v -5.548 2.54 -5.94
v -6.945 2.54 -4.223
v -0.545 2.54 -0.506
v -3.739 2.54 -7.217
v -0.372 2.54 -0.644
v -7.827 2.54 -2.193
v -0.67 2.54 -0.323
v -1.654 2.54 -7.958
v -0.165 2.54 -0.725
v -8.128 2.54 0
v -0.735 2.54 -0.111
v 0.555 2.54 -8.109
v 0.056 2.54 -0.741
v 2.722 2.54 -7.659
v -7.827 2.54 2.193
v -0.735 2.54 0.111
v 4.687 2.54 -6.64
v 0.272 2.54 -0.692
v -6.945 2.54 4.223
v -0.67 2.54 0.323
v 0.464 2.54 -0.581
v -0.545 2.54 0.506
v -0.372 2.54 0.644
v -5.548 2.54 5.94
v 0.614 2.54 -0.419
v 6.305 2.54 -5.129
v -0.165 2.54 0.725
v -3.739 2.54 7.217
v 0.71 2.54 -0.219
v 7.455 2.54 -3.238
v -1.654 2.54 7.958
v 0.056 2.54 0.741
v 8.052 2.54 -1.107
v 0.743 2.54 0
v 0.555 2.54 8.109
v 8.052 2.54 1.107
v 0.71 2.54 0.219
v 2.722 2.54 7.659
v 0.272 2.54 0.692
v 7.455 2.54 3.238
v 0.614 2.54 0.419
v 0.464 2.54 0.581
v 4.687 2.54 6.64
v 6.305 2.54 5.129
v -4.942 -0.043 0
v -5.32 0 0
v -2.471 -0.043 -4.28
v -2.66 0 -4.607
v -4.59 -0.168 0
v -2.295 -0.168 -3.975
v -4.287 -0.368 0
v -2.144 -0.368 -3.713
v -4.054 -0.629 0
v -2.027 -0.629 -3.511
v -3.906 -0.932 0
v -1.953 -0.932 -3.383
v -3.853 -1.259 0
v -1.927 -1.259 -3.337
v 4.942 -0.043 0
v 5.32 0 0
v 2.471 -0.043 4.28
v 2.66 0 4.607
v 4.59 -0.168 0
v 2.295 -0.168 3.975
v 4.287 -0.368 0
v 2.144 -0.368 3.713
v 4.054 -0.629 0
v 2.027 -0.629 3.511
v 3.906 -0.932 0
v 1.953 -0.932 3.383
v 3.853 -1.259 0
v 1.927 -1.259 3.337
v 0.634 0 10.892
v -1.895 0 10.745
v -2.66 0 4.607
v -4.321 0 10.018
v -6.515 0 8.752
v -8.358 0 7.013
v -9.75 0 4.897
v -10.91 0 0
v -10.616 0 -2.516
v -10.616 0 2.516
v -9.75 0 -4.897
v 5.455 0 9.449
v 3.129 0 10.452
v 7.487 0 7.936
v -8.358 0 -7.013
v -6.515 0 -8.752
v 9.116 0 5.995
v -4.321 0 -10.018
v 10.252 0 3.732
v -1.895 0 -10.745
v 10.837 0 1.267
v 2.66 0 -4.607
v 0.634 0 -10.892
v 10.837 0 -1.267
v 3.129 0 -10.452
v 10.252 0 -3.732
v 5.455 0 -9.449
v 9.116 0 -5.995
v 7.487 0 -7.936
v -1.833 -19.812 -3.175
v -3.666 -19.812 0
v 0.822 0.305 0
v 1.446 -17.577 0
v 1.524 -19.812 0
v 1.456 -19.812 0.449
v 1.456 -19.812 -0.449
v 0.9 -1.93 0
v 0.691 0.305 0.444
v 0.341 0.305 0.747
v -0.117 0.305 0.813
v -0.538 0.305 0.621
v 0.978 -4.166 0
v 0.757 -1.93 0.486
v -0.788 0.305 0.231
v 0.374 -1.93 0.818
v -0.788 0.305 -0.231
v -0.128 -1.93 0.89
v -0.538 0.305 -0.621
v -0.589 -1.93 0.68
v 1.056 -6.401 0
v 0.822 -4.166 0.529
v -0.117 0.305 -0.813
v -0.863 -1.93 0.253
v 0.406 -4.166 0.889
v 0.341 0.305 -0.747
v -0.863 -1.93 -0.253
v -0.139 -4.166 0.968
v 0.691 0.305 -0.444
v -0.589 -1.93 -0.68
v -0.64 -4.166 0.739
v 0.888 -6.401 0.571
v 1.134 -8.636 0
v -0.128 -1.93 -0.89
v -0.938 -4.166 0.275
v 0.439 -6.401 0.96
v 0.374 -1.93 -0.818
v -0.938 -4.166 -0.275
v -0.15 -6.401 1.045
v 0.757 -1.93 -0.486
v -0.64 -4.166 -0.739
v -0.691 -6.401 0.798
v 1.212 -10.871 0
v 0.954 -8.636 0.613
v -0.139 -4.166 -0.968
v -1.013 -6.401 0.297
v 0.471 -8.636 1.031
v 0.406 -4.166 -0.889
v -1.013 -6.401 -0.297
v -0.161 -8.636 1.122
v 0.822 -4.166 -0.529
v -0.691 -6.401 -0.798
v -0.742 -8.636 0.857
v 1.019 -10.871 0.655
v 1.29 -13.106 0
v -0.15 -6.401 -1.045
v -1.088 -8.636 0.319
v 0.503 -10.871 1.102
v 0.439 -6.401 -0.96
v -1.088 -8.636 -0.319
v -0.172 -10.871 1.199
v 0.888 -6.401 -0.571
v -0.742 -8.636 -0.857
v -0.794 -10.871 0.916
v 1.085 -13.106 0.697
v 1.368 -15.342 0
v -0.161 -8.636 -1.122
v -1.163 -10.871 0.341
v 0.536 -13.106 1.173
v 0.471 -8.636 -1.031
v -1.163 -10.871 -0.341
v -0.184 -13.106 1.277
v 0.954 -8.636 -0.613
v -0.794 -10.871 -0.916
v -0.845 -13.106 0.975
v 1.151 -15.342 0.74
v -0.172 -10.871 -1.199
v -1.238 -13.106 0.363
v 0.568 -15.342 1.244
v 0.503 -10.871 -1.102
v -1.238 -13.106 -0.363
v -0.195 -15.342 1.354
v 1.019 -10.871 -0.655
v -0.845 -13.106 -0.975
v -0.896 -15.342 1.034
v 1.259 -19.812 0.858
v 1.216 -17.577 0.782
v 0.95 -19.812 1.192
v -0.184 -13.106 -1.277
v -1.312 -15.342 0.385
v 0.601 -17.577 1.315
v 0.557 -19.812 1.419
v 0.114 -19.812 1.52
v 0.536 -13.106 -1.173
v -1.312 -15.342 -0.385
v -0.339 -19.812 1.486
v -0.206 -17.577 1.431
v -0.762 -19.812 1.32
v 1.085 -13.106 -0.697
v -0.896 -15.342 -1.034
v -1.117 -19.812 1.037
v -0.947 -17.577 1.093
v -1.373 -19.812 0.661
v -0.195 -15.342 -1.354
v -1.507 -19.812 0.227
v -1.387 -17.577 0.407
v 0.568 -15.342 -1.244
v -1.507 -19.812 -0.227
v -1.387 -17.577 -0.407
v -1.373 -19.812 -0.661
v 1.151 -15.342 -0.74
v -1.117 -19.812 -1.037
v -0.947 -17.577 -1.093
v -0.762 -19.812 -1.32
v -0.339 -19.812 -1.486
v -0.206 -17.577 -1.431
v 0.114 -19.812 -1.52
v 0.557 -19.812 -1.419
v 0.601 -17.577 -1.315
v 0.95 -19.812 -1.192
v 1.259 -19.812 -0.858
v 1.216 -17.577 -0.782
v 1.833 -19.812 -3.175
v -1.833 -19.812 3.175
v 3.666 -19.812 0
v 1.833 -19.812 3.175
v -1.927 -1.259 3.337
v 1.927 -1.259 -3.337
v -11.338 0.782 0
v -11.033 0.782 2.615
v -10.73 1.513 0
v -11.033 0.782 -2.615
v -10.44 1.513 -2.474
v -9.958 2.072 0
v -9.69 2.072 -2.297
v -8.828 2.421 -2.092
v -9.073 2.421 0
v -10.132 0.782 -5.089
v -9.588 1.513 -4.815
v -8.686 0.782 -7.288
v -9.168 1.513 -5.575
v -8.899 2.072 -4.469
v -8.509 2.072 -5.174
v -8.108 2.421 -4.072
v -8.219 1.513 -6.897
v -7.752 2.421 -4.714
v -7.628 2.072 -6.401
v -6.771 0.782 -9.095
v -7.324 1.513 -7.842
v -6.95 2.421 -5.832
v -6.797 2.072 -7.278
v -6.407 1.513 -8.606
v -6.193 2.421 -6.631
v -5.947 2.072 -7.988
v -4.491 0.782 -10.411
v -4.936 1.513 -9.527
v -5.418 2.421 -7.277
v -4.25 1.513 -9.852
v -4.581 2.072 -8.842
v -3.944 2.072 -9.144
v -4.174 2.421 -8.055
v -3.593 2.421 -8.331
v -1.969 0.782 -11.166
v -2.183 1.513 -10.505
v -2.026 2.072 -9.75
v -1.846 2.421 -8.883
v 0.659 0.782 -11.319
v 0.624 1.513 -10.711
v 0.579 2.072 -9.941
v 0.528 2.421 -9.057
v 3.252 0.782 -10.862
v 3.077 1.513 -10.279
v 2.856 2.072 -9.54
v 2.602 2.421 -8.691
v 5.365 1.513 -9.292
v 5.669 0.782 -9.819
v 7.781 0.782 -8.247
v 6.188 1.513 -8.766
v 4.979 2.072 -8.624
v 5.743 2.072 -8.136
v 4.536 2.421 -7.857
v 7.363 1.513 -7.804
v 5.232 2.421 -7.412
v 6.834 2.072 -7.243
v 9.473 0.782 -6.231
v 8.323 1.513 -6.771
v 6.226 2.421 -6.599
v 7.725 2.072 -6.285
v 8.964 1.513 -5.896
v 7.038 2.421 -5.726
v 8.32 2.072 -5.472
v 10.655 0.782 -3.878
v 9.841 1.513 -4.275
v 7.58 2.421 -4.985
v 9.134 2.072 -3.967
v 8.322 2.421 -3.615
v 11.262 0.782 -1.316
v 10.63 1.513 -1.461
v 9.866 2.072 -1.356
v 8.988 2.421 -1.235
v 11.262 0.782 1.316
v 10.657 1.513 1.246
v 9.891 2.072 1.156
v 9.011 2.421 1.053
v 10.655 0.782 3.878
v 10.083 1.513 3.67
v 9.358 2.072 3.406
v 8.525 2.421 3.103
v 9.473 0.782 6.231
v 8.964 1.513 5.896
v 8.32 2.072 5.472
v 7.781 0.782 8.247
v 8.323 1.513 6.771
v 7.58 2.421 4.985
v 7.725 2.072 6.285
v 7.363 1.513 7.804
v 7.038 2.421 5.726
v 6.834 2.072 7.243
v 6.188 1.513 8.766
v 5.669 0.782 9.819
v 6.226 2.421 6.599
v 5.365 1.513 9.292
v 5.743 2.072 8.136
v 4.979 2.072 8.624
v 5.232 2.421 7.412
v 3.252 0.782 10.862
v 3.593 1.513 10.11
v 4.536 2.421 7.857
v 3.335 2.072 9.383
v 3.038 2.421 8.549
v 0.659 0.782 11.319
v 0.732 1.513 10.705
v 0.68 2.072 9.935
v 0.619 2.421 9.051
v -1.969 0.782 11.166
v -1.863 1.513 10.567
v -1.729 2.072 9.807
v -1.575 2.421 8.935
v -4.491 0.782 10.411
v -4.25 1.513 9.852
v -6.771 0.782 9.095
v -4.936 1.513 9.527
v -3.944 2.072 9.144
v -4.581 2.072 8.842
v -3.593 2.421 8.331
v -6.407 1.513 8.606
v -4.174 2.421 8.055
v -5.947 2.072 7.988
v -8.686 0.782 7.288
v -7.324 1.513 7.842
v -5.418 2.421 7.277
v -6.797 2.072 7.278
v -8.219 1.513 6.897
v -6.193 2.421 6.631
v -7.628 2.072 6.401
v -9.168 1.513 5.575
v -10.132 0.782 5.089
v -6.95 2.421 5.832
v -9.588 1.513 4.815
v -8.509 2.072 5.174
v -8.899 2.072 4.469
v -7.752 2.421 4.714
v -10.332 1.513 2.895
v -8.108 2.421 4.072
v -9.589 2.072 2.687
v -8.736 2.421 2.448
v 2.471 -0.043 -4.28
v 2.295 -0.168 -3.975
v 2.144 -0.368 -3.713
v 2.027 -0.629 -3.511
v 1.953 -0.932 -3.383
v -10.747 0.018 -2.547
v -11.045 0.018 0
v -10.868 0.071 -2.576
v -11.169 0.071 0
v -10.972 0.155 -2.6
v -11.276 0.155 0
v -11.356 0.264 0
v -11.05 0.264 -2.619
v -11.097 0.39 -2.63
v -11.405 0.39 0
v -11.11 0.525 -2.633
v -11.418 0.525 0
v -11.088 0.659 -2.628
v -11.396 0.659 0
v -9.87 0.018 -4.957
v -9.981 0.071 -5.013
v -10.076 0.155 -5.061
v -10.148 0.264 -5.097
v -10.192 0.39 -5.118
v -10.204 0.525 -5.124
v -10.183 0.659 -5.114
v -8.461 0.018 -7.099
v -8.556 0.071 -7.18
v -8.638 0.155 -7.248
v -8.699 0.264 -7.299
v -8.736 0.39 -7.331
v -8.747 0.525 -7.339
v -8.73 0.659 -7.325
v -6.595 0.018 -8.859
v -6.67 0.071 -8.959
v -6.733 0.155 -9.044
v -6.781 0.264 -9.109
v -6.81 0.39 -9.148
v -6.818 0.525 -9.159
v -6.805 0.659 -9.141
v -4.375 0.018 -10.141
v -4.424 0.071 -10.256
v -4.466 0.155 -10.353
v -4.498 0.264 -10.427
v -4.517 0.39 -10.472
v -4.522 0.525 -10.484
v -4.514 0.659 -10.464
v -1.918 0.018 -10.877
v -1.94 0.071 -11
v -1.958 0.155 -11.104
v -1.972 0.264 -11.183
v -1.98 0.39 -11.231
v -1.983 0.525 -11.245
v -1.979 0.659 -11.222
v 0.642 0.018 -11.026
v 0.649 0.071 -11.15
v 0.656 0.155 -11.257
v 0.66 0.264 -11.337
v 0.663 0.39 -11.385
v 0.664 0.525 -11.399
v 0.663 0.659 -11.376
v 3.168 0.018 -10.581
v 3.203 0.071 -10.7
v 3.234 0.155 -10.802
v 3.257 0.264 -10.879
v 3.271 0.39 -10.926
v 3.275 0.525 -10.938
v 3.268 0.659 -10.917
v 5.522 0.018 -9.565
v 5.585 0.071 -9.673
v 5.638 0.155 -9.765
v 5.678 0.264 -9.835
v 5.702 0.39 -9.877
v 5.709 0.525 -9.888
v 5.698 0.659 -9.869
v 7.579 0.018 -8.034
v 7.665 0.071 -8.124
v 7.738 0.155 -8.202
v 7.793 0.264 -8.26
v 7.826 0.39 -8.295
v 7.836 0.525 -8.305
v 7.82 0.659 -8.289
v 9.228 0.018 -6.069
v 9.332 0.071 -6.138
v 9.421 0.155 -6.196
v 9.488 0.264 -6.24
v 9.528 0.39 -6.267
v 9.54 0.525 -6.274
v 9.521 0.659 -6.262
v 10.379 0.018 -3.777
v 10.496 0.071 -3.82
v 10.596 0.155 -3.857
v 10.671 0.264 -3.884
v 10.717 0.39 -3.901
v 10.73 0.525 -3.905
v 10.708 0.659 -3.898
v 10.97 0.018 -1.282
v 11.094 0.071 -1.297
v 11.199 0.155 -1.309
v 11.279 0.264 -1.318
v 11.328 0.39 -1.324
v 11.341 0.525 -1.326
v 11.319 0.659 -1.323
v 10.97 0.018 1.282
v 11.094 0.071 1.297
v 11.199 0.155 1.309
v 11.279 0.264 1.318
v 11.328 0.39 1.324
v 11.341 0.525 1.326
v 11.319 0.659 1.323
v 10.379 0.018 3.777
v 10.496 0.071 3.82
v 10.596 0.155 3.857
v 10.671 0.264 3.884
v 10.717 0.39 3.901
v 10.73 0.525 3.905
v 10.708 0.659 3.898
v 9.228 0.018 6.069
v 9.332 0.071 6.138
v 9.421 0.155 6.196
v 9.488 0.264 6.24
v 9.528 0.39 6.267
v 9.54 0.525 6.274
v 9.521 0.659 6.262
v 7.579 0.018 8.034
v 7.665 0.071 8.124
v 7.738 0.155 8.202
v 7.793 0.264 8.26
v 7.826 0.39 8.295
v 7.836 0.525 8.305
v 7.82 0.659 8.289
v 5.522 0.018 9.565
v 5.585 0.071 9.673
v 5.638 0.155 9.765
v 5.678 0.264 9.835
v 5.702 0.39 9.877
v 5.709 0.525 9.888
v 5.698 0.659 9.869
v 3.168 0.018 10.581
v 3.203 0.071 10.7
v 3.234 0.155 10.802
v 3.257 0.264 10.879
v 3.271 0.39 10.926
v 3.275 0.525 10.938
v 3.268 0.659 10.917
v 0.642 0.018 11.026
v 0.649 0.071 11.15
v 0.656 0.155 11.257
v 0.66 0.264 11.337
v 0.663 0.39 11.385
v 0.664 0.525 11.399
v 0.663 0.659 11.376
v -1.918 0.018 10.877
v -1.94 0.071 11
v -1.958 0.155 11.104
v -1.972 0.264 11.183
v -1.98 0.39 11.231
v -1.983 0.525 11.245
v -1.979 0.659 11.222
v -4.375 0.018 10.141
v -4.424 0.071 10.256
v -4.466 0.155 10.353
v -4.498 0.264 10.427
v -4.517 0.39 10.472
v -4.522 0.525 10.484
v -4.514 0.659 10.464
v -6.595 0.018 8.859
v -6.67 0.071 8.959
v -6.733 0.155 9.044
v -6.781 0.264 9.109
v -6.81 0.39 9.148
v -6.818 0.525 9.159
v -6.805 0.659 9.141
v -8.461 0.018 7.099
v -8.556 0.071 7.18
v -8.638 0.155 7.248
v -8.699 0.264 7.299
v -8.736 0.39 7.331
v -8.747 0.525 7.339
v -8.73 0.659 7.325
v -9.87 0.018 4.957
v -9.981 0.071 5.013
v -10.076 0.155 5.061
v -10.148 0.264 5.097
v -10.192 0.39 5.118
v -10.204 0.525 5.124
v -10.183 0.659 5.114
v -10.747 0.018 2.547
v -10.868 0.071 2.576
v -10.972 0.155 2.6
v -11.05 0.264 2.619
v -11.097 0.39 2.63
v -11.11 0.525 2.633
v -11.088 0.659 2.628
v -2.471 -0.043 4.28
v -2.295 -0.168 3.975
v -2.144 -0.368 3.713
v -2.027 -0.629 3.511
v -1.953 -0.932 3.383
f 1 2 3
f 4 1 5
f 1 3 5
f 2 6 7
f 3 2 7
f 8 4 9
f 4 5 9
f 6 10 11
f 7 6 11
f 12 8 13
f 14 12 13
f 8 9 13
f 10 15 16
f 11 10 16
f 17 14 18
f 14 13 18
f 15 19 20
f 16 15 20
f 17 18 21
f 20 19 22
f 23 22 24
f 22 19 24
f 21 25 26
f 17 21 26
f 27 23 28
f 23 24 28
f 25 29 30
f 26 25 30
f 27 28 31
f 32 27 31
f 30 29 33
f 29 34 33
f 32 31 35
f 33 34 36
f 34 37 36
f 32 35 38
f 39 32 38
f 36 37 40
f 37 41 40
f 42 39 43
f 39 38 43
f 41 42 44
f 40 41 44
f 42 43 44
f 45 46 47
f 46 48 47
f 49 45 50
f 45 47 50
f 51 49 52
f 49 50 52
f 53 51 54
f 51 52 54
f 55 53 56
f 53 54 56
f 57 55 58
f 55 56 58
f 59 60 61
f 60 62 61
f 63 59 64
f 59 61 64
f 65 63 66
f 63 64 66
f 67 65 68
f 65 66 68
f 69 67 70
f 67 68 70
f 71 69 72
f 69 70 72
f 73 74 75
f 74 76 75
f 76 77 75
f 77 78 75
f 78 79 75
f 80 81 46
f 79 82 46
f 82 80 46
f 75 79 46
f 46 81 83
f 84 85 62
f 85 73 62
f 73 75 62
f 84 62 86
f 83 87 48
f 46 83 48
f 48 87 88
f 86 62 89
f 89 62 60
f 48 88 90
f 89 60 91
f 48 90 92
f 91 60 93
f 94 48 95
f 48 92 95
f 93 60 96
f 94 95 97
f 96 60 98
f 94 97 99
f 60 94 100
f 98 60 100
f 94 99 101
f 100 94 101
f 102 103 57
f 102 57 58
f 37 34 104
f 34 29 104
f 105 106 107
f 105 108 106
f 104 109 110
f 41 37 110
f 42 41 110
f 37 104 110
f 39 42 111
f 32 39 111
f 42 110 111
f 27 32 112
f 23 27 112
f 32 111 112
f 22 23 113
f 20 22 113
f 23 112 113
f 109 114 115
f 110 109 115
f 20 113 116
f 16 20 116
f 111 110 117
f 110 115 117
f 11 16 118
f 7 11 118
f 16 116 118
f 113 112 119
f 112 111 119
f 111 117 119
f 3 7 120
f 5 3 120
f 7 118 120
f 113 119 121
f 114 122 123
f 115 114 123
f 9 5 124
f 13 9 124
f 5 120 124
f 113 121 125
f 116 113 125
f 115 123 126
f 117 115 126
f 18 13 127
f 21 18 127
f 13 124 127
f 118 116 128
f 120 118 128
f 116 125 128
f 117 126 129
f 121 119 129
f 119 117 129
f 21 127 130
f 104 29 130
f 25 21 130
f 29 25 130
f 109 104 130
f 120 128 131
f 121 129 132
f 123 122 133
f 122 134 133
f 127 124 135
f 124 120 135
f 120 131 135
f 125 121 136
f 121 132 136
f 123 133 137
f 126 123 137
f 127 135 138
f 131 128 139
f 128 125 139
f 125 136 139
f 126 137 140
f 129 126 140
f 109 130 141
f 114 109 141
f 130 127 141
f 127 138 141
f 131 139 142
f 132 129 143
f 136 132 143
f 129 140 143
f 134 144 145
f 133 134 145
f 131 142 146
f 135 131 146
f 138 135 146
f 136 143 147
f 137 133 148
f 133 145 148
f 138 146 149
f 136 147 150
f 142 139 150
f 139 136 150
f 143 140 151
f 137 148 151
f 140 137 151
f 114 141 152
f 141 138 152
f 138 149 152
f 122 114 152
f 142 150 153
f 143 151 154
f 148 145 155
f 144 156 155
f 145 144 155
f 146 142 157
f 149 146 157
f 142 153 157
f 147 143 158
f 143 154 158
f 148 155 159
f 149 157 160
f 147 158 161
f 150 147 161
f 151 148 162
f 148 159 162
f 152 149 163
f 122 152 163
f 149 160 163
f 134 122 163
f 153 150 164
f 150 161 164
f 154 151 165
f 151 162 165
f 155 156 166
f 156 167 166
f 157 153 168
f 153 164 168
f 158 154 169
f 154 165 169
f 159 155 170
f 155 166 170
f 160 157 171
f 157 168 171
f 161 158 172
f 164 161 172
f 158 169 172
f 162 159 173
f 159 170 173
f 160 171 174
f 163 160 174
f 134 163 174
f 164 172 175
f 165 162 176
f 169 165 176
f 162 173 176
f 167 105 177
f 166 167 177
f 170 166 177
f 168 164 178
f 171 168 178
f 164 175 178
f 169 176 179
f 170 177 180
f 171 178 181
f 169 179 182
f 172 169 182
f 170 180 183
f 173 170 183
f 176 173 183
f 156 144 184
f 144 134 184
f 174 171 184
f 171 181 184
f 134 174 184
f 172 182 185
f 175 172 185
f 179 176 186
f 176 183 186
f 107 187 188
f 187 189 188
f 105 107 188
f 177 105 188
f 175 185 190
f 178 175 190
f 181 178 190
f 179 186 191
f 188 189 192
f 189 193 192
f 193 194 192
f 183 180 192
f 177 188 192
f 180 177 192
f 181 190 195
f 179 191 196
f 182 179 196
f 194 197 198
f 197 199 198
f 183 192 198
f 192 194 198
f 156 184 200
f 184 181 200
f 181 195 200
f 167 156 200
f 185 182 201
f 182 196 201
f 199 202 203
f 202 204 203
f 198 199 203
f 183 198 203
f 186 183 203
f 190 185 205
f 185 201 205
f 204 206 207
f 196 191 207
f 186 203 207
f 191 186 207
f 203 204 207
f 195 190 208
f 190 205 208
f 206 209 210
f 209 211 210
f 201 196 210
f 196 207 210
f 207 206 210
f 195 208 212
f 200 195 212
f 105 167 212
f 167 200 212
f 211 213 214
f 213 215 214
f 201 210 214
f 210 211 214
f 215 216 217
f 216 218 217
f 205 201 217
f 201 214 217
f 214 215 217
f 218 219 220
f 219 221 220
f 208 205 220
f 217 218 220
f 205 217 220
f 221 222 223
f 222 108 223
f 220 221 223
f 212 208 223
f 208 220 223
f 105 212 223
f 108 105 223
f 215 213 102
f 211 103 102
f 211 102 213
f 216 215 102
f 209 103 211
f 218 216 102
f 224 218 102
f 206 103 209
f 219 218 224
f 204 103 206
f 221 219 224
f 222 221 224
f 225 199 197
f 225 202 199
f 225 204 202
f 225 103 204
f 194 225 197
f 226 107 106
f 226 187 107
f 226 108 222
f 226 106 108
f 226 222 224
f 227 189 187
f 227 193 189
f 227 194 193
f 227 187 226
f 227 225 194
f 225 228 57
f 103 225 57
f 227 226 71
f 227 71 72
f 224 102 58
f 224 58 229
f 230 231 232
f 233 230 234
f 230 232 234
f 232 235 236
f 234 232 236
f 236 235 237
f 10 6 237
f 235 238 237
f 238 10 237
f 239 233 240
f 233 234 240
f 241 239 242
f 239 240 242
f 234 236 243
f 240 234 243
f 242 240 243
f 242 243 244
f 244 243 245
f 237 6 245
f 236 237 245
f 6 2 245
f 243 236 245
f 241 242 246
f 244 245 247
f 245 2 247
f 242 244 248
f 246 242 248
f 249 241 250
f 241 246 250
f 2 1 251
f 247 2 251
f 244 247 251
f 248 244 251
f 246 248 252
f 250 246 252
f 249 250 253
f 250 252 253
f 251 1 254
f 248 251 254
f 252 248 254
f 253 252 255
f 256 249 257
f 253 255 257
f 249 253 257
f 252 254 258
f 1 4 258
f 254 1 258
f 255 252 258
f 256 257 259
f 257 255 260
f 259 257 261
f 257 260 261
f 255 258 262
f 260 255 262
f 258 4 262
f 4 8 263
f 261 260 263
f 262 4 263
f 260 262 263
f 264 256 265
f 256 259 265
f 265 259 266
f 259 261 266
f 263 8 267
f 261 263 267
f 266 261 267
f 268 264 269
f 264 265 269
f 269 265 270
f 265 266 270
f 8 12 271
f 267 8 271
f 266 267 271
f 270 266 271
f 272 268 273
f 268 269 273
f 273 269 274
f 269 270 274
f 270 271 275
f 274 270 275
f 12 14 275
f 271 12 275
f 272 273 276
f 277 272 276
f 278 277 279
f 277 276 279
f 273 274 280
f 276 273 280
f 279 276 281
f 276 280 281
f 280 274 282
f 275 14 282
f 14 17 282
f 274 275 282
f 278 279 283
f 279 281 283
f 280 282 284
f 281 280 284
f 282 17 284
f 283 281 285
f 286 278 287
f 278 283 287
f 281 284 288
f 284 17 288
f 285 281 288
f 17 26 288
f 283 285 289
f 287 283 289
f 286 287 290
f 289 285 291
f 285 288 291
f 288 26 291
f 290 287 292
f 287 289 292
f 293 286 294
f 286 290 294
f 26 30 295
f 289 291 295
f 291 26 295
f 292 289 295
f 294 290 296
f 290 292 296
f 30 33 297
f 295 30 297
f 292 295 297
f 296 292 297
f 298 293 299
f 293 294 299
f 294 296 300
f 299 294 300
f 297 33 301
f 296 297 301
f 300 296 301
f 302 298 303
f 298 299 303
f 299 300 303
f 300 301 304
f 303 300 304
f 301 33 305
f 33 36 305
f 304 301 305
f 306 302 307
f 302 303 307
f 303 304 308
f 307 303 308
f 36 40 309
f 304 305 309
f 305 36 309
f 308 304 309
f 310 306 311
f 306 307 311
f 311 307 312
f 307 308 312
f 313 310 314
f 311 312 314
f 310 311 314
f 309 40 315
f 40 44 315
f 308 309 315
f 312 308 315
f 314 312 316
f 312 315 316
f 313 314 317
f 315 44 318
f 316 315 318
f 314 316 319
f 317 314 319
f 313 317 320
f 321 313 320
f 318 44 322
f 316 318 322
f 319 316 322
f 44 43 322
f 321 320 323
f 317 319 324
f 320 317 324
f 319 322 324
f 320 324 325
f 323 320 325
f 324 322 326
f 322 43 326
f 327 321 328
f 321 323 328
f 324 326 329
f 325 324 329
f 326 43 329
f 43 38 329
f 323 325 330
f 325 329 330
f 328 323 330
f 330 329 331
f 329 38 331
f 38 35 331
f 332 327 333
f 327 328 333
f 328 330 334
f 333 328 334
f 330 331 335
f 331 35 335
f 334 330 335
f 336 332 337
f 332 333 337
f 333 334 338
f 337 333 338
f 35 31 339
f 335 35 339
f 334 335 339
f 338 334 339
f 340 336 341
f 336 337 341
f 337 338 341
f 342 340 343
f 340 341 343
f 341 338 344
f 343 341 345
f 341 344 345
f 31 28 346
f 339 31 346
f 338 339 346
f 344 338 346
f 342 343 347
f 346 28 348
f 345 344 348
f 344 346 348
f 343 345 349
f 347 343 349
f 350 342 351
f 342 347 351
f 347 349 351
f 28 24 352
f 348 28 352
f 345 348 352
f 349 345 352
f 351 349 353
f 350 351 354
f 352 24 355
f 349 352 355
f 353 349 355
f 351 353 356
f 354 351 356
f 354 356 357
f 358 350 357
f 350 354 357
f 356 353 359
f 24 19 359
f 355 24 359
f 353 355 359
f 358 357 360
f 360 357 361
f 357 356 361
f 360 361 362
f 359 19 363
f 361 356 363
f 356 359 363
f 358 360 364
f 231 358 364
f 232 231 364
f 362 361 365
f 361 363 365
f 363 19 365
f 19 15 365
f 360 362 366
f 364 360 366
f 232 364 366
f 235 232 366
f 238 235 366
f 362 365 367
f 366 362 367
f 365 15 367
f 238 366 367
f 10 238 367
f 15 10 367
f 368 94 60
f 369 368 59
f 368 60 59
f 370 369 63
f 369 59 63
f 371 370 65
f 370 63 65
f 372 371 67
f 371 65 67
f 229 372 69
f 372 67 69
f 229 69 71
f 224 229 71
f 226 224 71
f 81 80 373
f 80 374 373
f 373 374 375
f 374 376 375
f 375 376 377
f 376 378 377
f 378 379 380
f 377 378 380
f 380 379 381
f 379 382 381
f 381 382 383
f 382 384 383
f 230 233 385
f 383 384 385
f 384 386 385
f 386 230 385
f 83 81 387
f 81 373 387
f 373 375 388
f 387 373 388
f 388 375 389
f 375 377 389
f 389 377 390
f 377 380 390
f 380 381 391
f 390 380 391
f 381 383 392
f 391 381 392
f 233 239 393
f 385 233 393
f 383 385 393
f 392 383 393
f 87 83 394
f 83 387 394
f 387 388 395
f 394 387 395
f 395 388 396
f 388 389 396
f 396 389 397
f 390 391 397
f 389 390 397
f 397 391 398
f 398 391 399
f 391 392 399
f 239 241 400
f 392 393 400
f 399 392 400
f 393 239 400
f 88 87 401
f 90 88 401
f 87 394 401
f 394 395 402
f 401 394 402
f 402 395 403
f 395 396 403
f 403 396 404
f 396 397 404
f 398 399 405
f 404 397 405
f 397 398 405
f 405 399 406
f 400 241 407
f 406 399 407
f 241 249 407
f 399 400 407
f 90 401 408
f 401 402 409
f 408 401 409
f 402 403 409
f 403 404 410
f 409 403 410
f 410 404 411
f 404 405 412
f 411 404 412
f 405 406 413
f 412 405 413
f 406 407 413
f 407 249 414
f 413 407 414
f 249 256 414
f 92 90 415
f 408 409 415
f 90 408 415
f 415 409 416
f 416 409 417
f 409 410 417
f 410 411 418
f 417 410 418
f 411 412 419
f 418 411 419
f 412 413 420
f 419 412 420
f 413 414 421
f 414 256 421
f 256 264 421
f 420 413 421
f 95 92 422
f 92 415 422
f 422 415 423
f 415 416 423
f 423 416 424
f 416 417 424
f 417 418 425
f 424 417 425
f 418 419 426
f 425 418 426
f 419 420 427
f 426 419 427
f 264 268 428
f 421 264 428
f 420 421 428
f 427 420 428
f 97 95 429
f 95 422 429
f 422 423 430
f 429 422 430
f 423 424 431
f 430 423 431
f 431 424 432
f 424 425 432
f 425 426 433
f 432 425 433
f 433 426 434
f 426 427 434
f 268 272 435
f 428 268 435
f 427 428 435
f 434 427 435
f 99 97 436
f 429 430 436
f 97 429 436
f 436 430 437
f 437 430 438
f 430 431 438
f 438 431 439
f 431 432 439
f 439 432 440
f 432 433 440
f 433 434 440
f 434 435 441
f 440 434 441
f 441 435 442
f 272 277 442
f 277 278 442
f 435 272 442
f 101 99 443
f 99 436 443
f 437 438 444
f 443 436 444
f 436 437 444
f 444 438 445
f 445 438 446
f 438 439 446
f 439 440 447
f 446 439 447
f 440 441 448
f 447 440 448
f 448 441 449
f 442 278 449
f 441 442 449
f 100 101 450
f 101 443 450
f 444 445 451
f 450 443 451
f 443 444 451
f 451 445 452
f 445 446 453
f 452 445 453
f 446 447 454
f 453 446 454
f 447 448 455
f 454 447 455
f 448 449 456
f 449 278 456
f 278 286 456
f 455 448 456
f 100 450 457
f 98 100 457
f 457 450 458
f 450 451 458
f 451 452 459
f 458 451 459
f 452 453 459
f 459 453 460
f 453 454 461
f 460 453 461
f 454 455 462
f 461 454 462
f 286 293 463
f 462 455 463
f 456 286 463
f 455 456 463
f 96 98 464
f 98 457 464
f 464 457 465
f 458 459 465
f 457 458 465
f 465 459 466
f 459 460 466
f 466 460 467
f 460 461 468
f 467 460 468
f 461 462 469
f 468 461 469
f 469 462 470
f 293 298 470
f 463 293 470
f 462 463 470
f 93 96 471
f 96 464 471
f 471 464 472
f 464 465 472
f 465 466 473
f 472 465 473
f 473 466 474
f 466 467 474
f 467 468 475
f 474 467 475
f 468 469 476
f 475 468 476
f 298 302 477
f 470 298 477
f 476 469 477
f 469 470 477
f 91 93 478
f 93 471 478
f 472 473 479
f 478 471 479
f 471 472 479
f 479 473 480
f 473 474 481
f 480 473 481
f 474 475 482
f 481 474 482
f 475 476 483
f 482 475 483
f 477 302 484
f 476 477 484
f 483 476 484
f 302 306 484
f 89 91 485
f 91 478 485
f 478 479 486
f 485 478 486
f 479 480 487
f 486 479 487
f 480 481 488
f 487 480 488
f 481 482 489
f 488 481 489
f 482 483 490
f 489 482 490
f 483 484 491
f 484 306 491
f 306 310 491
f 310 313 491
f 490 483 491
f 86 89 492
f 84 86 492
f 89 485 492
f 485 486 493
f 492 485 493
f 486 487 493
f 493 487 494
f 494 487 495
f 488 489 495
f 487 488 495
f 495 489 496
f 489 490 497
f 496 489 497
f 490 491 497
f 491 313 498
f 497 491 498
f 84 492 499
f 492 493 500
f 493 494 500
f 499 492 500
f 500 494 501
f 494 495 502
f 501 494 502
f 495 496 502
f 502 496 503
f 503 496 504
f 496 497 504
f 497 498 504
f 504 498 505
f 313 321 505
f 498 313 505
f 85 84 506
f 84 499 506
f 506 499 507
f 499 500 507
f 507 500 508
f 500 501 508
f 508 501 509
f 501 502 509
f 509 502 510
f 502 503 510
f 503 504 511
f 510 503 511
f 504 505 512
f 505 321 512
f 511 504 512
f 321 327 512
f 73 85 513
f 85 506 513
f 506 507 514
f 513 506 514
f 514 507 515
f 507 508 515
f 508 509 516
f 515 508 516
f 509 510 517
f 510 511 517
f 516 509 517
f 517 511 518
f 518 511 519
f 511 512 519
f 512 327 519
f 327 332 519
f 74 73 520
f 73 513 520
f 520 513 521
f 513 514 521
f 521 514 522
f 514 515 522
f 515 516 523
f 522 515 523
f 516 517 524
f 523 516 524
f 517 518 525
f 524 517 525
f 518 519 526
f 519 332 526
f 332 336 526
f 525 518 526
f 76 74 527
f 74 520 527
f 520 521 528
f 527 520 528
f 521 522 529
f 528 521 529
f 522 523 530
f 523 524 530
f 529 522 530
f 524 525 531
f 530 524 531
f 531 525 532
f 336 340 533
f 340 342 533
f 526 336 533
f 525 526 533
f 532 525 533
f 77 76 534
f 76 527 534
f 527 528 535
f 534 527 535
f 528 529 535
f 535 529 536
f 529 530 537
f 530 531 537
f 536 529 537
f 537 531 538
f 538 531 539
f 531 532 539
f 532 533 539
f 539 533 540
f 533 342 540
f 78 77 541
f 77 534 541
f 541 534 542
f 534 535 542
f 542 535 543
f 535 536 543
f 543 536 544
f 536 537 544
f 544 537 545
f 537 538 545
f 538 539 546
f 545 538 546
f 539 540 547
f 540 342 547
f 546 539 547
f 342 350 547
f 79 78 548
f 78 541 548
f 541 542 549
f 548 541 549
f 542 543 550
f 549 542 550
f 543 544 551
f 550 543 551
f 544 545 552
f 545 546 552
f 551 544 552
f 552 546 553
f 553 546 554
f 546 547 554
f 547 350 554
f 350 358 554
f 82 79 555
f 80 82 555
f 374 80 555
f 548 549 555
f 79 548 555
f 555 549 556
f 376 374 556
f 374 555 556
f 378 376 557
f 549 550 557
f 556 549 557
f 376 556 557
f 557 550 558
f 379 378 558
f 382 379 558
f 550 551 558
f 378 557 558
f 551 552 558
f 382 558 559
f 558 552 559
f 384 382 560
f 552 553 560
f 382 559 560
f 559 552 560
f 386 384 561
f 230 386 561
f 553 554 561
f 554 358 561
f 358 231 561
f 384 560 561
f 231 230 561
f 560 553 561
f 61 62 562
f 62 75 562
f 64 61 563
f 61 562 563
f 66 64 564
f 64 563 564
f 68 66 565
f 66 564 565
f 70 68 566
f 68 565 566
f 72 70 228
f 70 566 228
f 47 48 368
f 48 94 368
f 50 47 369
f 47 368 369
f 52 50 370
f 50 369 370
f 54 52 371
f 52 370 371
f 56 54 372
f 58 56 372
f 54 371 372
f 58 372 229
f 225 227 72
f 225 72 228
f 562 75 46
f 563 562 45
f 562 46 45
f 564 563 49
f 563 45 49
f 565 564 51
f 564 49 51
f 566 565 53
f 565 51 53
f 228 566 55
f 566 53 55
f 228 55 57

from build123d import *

# Parameters (mm, degrees)
SHAFT_DEPTH          = 22.352
DRAFT_ON_SHAFT_ANGLE = 0.5
SKETCH3_R            = 1.524
THRU_HOLE_DEPTH      = 28.574862156
THRU_HOLE_DRAFT      = -2
FILLET1_R            = 1.27


with BuildPart() as part:
    # Sketch1 → Head (revolve)
    with BuildSketch(Plane.XY):
        with BuildLine():
            Line((0, 0), (10.910430592, 0))
            ThreePointArc((10.910430592, 0), (11.355976066, 0.263964694), (11.338496837, 0.781538462))
            ThreePointArc((11.338496837, 0.781538462), (9.958264798, 2.071591054), (8.128, 2.54))
            Line((8.128, 2.54), (0, 2.54))
            Line((0, 2.54), (0, 0))
        make_face()
    revolve(axis=Axis((0, 2.54, 0), (0, -1, 0)))

    # Sketch2 → Shaft (add)
    with BuildSketch(Plane(origin=(0, 2.54, 0), x_dir=(-1, 0, 0), z_dir=(0, 1, 0))):
        Polygon((1.833087105, -3.175), (-1.833087105, -3.175), (-3.666174209, 0), (-1.833087105, 3.175), (1.833087105, 3.175), (3.666174209, 0), align=None)
    extrude(amount=-SHAFT_DEPTH)

    # Draft on Shaft
    draft_on_shaft_faces = [part.faces().sort_by_distance(p)[0] for p in [
        (0, -9.906, 3.175),
        (2.749630657, -9.906, 1.5875),
        (2.749630657, -9.906, -1.5875),
        (0, -9.906, -3.175),
        (-2.749630657, -9.906, -1.5875),
        (-2.749630657, -9.906, 1.5875),
    ]]
    draft(draft_on_shaft_faces, Plane(origin=(5.499261314, -19.812, 3.175), x_dir=(-1, 0, 0), z_dir=(0, -1, 0)), DRAFT_ON_SHAFT_ANGLE)


with BuildPart() as thru_hole_tool:
    # Sketch3 → Thru Hole (with draft: the straight prism first)
    with BuildSketch(Plane.XZ.offset(19.812)):
        Circle(SKETCH3_R)
    extrude(amount=-THRU_HOLE_DEPTH)
    # Thru Hole: the draft: its side faces are tilted about the plane it starts from
    thru_hole_sides = [thru_hole_tool.faces().sort_by_distance(p)[0] for p in [
        (-1.524, -5.524568922, 0),
    ]]
    draft(thru_hole_sides, Plane.XZ.offset(19.812), THRU_HOLE_DRAFT)


with BuildPart() as part_1:
    add(part.part)

    # Thru Hole: cut by thru_hole_tool
    add(thru_hole_tool.part, mode=Mode.SUBTRACT)

    # Fillet1
    fillet1_edges = [part_1.edges().sort_by_distance(p)[0] for p in [
        (0, 0, -3.347896705),
        (-2.899363595, 0, -1.673948352),
        (-2.899363595, 0, 1.673948352),
        (0, 0, 3.347896705),
        (2.899363595, 0, 1.673948352),
        (2.899363595, 0, -1.673948352),
    ]]
    fillet(fillet1_edges, radius=FILLET1_R)


solid = part_1.part
